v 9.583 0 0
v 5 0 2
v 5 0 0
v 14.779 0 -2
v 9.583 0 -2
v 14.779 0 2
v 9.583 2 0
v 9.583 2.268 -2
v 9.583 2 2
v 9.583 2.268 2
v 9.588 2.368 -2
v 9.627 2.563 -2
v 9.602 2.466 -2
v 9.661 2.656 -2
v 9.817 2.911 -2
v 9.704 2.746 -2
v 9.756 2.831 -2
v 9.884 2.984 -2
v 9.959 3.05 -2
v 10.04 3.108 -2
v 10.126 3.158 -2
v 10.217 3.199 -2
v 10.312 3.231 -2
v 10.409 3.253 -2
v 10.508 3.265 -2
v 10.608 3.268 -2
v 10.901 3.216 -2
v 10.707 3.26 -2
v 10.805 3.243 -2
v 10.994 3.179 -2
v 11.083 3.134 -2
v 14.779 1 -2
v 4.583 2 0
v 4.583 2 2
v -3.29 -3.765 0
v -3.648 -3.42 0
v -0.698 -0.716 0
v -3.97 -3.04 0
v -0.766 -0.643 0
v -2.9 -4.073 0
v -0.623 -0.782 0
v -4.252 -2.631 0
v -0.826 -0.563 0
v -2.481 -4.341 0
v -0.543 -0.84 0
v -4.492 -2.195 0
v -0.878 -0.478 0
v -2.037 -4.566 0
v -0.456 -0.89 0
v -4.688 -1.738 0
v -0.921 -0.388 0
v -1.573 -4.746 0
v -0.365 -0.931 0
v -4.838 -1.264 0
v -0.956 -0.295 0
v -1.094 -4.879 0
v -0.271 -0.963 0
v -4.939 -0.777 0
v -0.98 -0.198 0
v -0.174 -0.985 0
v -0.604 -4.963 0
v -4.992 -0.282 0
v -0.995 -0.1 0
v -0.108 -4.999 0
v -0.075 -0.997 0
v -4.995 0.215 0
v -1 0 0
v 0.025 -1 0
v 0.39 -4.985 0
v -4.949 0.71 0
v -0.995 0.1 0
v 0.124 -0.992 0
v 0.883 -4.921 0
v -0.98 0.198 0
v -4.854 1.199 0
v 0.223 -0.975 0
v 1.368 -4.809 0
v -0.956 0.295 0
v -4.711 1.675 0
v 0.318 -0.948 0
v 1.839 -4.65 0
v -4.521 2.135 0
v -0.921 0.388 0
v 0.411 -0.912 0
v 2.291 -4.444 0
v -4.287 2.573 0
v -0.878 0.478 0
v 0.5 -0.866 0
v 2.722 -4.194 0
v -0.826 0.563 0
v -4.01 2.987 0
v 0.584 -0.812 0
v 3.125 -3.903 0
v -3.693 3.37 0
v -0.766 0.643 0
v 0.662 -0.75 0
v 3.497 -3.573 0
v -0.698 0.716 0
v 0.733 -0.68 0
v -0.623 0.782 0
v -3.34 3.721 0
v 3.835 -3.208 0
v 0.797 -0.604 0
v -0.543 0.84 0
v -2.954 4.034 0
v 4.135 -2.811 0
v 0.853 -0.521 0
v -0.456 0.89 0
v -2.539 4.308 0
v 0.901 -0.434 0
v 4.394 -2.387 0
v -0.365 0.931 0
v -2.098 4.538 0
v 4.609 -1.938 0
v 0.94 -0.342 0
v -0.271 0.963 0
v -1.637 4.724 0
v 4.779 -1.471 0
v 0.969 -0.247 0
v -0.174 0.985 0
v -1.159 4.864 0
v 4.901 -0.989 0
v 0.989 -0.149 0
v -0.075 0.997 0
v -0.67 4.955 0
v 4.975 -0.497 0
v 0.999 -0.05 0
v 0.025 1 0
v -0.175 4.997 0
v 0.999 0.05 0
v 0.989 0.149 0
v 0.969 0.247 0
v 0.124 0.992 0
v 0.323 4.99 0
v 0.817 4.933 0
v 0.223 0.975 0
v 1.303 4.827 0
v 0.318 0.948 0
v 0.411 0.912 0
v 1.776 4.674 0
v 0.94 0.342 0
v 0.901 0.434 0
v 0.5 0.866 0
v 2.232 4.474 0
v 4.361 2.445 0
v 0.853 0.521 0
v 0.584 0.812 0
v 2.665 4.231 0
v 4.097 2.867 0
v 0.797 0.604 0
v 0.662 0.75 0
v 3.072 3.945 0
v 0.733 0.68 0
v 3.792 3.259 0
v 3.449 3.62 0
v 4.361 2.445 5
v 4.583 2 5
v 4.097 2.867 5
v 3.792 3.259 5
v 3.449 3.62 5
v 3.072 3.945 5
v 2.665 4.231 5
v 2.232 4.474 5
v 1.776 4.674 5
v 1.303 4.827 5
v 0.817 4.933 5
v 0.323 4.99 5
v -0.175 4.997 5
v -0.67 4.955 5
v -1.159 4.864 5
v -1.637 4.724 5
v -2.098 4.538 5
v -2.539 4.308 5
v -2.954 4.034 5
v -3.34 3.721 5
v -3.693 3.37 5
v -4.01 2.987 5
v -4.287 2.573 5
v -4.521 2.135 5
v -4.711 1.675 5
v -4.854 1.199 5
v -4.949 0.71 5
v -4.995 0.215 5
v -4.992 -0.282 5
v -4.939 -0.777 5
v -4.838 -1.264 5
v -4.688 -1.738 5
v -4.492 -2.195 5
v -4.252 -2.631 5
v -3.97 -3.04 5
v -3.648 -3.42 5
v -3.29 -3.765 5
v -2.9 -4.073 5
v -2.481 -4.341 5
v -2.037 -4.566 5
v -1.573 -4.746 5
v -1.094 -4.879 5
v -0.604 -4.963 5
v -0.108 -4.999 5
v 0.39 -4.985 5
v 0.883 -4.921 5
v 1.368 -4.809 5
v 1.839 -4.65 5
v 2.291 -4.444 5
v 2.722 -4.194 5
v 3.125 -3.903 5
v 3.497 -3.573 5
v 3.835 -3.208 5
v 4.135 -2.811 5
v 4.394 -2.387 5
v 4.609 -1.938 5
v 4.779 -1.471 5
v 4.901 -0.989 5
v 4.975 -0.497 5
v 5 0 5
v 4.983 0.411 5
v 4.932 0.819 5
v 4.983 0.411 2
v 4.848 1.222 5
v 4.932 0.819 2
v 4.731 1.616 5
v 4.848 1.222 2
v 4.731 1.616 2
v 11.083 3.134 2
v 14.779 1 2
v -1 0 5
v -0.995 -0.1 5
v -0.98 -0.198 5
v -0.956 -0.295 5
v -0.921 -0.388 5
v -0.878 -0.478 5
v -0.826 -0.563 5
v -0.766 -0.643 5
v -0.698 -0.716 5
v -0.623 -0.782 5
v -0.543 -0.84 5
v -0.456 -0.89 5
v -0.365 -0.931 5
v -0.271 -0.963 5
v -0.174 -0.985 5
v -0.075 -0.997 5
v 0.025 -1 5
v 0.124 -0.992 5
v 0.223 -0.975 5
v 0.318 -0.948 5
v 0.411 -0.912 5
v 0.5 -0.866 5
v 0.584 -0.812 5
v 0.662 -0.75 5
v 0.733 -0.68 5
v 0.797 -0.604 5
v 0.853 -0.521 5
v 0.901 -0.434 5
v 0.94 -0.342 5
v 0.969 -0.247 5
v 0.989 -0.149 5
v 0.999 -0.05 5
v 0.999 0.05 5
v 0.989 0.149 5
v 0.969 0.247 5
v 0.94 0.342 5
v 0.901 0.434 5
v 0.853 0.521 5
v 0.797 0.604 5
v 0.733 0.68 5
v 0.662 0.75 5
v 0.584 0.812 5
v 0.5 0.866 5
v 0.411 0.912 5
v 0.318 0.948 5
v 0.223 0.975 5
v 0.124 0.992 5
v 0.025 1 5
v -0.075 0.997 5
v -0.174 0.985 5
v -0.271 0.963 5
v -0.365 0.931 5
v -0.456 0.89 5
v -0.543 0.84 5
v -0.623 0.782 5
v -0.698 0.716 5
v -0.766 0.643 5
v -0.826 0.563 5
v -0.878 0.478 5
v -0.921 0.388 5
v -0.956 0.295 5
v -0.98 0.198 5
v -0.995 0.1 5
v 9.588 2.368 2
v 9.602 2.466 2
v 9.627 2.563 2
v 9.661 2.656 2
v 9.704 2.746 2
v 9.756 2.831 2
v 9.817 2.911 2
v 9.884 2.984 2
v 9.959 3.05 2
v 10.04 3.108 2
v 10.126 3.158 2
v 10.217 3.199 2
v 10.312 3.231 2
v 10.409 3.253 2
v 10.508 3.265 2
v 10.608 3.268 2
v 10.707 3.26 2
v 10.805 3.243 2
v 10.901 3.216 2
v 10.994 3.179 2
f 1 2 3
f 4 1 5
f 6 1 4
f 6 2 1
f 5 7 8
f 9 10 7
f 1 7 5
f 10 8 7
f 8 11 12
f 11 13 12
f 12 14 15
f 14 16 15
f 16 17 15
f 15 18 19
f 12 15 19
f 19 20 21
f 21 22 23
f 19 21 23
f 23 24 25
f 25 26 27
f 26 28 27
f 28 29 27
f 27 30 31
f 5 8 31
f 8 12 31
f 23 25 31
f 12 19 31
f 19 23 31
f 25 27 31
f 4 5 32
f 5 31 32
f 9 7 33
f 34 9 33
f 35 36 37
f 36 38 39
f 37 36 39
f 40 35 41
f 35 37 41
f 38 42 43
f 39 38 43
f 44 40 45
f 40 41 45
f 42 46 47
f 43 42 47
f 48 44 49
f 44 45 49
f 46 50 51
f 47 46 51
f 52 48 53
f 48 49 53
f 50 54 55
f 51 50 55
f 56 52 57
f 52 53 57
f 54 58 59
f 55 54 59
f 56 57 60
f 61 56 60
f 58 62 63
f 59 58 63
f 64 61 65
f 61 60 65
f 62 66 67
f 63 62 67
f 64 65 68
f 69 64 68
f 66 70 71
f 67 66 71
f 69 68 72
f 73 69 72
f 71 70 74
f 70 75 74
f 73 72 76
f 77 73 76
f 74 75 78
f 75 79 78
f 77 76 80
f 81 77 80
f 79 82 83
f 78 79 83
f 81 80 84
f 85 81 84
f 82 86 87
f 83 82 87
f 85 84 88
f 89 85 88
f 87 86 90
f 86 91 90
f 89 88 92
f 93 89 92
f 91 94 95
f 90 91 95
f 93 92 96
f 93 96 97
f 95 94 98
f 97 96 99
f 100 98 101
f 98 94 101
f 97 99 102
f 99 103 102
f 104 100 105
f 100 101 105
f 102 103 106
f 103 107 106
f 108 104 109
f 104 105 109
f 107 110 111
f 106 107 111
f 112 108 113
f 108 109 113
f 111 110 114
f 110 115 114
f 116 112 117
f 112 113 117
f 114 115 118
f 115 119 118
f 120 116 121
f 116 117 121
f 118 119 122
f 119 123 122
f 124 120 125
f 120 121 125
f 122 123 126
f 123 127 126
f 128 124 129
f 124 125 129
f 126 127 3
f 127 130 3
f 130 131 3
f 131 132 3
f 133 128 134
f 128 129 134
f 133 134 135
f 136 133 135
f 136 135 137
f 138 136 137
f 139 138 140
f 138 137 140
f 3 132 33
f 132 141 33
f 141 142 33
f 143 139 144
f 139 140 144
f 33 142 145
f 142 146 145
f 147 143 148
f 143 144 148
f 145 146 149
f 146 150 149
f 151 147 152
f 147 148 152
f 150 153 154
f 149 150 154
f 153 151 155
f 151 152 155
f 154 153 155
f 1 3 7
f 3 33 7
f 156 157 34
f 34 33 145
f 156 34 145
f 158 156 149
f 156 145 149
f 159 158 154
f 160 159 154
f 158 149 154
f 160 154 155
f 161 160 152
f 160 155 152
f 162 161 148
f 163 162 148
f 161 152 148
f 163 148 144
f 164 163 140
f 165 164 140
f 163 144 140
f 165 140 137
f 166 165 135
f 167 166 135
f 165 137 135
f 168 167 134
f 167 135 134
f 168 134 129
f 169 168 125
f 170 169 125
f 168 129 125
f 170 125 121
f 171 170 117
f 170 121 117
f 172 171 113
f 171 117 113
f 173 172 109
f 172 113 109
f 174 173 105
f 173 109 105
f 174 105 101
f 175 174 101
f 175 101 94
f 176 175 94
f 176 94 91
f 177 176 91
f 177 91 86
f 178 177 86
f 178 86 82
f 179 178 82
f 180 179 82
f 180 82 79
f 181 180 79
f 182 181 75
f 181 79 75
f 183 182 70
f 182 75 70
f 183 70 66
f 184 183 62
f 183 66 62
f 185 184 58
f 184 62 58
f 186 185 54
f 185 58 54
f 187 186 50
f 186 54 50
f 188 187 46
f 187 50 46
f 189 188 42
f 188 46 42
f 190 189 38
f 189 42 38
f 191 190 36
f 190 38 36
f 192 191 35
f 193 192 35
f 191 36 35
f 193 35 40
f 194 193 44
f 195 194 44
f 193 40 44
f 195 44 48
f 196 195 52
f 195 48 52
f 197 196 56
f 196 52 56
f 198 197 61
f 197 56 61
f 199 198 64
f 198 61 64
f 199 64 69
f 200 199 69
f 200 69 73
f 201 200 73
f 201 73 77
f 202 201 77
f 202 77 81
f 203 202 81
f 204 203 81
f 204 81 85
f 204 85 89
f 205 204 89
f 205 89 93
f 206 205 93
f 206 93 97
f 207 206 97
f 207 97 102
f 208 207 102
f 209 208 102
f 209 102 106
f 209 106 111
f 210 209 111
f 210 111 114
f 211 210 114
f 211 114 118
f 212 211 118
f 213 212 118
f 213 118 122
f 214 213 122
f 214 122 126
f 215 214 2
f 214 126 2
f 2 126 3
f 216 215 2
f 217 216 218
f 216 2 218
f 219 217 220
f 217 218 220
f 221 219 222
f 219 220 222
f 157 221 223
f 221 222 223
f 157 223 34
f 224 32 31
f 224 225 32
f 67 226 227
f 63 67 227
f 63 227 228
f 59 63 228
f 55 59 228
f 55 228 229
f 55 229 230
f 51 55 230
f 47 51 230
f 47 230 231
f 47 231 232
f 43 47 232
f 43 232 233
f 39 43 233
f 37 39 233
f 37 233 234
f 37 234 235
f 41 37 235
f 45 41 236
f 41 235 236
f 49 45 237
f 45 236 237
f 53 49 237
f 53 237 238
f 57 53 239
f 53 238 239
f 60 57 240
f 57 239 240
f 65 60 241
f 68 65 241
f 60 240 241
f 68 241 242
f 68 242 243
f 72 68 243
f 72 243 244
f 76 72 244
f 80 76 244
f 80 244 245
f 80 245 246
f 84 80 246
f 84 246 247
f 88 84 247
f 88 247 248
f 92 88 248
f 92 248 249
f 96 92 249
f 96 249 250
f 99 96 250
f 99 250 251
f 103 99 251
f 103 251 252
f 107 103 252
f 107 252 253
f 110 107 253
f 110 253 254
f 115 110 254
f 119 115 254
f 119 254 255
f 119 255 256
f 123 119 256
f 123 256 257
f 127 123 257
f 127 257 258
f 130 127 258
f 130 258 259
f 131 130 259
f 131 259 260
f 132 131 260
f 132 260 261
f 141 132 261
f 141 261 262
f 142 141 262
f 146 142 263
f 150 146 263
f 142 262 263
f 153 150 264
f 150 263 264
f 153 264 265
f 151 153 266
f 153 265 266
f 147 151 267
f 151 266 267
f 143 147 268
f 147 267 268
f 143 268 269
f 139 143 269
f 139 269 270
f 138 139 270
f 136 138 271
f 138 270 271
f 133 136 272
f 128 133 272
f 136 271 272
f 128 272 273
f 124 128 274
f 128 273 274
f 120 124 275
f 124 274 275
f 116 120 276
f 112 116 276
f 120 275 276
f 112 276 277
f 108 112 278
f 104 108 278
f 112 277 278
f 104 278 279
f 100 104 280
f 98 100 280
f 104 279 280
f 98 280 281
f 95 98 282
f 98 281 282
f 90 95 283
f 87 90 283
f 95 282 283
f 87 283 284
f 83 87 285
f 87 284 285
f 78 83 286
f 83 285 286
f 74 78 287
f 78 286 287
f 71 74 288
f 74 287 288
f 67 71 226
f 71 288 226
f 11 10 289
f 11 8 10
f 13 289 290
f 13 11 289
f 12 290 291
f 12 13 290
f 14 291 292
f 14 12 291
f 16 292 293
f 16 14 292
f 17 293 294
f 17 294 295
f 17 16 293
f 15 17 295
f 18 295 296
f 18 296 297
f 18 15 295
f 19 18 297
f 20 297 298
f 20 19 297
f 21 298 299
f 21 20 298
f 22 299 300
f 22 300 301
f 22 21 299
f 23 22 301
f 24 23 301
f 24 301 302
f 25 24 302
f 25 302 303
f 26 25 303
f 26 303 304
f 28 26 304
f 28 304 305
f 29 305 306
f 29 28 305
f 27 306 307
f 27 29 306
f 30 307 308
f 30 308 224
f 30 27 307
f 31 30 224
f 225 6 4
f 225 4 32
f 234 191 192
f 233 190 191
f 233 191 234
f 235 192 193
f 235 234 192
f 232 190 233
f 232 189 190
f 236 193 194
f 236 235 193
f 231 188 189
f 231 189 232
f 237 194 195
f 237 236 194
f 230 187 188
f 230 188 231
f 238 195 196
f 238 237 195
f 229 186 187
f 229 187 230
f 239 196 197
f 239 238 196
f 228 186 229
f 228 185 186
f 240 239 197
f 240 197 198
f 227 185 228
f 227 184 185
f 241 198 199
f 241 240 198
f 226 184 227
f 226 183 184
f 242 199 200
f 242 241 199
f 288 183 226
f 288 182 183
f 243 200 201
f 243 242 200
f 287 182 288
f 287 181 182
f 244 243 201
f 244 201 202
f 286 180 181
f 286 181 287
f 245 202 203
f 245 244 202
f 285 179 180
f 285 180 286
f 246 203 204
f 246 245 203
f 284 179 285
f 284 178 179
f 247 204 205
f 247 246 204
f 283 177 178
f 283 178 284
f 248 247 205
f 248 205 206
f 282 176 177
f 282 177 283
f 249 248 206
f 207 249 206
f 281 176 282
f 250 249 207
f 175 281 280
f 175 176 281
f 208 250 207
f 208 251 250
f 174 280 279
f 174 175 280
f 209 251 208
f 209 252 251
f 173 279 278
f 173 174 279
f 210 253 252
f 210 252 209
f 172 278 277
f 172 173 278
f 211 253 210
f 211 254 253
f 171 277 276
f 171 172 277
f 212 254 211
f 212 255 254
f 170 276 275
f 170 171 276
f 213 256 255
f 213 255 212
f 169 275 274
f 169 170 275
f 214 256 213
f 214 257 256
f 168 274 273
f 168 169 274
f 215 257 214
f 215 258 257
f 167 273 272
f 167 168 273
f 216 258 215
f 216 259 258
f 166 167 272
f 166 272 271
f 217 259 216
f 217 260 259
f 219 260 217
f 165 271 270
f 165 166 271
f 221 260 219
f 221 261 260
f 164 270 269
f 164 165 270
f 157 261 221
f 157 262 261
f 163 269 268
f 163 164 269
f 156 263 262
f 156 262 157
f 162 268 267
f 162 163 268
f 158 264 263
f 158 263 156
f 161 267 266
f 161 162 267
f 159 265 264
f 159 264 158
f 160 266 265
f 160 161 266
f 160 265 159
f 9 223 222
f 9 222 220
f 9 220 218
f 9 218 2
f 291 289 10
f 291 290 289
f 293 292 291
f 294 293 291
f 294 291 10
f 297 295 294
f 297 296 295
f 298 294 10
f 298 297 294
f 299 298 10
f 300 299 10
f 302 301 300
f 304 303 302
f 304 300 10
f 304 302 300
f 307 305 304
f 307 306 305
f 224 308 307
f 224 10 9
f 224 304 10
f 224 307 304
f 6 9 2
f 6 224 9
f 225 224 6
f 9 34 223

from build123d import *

# Parameters (mm, degrees)
F1_DEPTH = 5
F2_DEPTH = 2
F3_DEPTH = 2
F4_D     = 2
F5_R     = 1


with BuildPart() as f1:
    # F0 (on Top) → F1 (new body)
    with BuildSketch(Plane.XY):
        with BuildLine():
            ThreePointArc((4.582576, 2), (-4.894532, -1.021548), (5, 0))
            ThreePointArc((5, 0), (4.894532, 1.021548), (4.582576, 2))
        make_face()
    extrude(amount=F1_DEPTH)

    # F0 (on Top) → F2 (join)
    with BuildSketch(Plane.XY):
        with BuildLine():
            ThreePointArc((4.582576, 2), (4.894532, 1.021548), (5, 0))
            Line((5, 0), (9.582576, 0))
            Line((9.582576, 0), (9.582576, 2))
            Line((9.582576, 2), (4.582576, 2))
        make_face()
    extrude(amount=F2_DEPTH)

    # F0 (on Top) → F3 (join, symmetric)
    with BuildSketch(Plane.XY):
        Polygon((9.582576, 2), (9.582576, 0), (14.778728, 0), (14.778728, 1), (9.582576, 4), align=None)
    extrude(amount=F3_DEPTH, both=True)

    # F4 (through all)
    with Locations(Plane(origin=(0, 0, 0), x_dir=(1, 0, 0), z_dir=(0, 0, -1))):
        with Locations((0, 0)):
            Hole(F4_D / 2)

    # F5
    f5_edges = [f1.edges().sort_by_distance(p)[0] for p in [
        (9.582576, 4, 0),
    ]]
    fillet(f5_edges, radius=F5_R)


solid = f1.part
